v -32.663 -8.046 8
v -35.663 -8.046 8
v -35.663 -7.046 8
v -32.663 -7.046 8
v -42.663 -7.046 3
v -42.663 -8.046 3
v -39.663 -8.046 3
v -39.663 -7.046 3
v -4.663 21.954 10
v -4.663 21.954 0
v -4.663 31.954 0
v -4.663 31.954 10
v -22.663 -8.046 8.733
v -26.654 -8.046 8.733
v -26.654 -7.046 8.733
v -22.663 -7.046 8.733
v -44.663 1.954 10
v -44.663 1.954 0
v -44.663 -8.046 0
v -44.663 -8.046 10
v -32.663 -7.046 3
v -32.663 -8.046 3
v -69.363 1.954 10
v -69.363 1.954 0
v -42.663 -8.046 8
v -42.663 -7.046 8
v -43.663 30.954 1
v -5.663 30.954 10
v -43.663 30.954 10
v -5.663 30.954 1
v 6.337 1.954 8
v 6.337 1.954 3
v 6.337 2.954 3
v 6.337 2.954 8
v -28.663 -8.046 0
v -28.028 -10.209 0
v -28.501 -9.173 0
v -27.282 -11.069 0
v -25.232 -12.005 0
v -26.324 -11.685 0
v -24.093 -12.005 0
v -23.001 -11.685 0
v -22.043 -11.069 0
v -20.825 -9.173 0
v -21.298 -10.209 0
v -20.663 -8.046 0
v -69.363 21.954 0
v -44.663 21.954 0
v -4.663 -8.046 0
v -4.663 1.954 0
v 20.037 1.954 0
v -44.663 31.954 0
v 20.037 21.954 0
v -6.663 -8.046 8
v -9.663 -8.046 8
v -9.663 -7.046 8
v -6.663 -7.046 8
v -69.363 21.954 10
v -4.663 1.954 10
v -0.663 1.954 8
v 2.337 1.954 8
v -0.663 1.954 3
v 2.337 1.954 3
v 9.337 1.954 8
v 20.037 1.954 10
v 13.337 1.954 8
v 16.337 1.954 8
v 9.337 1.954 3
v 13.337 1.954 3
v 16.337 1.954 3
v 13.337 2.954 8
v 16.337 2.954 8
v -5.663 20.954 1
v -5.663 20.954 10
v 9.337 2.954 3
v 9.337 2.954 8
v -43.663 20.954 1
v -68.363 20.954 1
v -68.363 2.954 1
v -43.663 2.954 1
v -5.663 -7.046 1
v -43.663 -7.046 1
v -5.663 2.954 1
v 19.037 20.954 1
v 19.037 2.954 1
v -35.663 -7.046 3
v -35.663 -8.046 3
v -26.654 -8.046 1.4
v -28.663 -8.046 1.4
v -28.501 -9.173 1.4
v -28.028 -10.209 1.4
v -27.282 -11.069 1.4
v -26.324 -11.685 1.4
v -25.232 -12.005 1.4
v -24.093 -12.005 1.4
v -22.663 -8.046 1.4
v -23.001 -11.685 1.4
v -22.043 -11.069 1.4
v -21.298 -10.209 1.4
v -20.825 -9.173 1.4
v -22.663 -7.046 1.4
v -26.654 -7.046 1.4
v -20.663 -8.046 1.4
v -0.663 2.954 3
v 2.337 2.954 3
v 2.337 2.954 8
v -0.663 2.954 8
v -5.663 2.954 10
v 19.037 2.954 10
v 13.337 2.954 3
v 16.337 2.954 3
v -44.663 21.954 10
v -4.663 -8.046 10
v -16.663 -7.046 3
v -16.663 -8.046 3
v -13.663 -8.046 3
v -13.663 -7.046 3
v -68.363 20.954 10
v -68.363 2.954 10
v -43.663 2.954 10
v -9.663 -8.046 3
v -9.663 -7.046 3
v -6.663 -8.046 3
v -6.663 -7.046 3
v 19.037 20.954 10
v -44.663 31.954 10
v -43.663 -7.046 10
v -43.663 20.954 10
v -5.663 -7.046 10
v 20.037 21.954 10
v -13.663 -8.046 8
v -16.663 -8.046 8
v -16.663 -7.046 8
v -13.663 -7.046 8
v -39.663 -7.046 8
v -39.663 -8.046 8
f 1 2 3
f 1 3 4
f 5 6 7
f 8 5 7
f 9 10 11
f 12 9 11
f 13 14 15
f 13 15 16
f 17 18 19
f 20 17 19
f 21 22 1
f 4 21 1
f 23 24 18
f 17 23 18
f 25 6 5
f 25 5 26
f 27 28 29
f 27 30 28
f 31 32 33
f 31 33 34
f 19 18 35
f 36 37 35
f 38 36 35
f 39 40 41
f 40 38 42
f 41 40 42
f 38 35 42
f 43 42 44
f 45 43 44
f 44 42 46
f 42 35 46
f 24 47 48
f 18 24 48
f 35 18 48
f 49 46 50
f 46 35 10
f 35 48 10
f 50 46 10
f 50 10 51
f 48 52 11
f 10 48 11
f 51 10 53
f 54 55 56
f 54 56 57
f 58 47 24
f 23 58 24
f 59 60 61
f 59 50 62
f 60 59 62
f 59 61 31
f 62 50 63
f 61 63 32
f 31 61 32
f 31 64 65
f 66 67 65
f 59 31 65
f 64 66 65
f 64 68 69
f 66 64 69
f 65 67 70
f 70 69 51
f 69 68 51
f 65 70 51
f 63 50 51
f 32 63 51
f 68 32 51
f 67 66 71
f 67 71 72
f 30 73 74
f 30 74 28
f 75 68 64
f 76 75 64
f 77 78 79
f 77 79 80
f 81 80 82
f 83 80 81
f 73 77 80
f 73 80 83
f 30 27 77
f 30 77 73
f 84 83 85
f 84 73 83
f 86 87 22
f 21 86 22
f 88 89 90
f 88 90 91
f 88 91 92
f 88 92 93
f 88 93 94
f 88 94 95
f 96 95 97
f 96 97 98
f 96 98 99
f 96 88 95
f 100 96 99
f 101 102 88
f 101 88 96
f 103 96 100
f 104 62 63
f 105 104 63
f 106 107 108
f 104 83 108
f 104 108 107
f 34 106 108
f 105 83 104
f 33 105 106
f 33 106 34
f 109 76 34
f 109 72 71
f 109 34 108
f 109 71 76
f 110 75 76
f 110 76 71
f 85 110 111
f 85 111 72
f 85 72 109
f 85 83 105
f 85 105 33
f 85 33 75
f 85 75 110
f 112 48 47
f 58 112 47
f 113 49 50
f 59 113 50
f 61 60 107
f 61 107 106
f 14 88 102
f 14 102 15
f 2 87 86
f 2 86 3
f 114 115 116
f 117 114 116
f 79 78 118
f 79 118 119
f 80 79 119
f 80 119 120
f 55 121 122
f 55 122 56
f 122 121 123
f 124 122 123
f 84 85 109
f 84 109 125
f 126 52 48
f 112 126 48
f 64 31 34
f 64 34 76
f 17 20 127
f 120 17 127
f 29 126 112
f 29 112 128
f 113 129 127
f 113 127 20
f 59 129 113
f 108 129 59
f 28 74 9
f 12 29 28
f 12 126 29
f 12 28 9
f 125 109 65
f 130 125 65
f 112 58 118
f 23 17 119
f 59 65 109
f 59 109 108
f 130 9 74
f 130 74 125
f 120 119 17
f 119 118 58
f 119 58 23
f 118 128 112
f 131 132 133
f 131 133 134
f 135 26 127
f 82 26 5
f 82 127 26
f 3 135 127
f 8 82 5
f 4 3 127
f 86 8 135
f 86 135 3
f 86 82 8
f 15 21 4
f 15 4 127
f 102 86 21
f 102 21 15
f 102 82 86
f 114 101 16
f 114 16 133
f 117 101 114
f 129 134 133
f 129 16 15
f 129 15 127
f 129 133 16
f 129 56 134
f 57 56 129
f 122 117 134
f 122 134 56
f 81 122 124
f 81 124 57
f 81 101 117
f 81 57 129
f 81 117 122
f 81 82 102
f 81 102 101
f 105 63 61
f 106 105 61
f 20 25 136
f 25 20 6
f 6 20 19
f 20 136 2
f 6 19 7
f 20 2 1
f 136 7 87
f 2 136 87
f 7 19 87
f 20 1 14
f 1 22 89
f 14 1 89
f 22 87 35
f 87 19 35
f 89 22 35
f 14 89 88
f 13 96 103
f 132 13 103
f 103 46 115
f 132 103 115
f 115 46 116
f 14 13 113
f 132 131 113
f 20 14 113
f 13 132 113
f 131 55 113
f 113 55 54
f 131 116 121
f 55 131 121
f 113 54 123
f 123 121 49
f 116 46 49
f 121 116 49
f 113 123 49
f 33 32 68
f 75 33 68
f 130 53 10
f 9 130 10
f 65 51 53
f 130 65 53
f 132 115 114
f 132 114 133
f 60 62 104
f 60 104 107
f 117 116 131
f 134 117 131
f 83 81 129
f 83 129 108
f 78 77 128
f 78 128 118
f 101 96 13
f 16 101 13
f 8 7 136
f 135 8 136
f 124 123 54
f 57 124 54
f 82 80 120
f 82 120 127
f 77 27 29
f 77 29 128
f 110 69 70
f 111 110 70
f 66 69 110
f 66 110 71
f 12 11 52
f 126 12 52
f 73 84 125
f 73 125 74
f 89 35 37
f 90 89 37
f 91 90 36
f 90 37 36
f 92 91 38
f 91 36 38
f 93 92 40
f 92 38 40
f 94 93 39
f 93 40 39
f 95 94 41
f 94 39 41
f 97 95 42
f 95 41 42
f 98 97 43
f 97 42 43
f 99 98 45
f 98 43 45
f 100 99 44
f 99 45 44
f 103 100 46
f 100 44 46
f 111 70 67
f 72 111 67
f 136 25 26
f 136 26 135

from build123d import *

# Parameters (mm, degrees)
F1_DEPTH = 10
F2_T     = -1
F3_DEPTH = 1.4
F4_W     = 3
F4_H     = 5
F4_W_2   = 3.991
F4_H_2   = 7.333
F5_DEPTH = 12


with BuildPart() as f1:
    # F0 (on Top) → F1 (new body)
    with BuildSketch(Plane.XY):
        with BuildLine():
            Line((-44.662655282, 31.9538097456), (-44.662655282, 21.9538097456))
            Line((-44.662655282, 21.9538097456), (-69.362655282, 21.9538097456))
            Line((-69.362655282, 21.9538097456), (-69.362655282, 1.9538097456))
            Line((-69.362655282, 1.9538097456), (-44.662655282, 1.9538097456))
            Line((-44.662655282, 1.9538097456), (-44.662655282, -8.0461902544))
            Line((-44.662655282, -8.0461902544), (-28.662655282, -8.0461902544))
            ThreePointArc((-28.662655282, -8.0461902544), (-24.662655282, -4.0461902544), (-20.662655282, -8.0461902544))
            Line((-20.662655282, -8.0461902544), (-4.662655282, -8.0461902544))
            Line((-4.662655282, -8.0461902544), (-4.662655282, 1.9538097456))
            Line((-4.662655282, 1.9538097456), (20.037344718, 1.9538097456))
            Line((20.037344718, 1.9538097456), (20.037344718, 21.9538097456))
            Line((20.037344718, 21.9538097456), (-4.662655282, 21.9538097456))
            Line((-4.662655282, 21.9538097456), (-4.662655282, 31.9538097456))
            Line((-4.662655282, 31.9538097456), (-44.662655282, 31.9538097456))
        make_face()
        with BuildLine():
            ThreePointArc((-20.662655282, -8.0461902544), (-24.662655282, -4.0461902544), (-28.662655282, -8.0461902544))
            Line((-28.662655282, -8.0461902544), (-20.662655282, -8.0461902544))
        make_face()
    extrude(amount=F1_DEPTH)

    # F2
    f2_openings = [f1.faces().sort_by_distance(p)[0] for p in [
        (-24.662655, 11.95381, 10),
    ]]
    offset(amount=F2_T, openings=f2_openings, kind=Kind.INTERSECTION)

    # F0 (on Top) → F3 (join)
    with BuildSketch(Plane.XY):
        with BuildLine():
            Line((-20.662655282, -8.0461902544), (-28.662655282, -8.0461902544))
            ThreePointArc((-28.662655282, -8.0461902544), (-24.662655282, -12.0461902544), (-20.662655282, -8.0461902544))
        make_face()
    extrude(amount=F3_DEPTH)

    # F4 (on face) → F5 (cut)
    with BuildSketch(Plane.XZ.offset(8.0461902544)):
        with Locations((-41.162655282, 5.5)):
            Rectangle(F4_W, F4_H)
        with Locations((-34.162655282, 5.5)):
            Rectangle(F4_W, F4_H)
        with Locations((-15.162655282, 5.5)):
            Rectangle(F4_W, F4_H)
        with Locations((-8.162655282, 5.5)):
            Rectangle(F4_W, F4_H)
        with Locations((0.837344718, 5.5)):
            Rectangle(F4_W, F4_H)
        with Locations((7.837344718, 5.5)):
            Rectangle(F4_W, F4_H)
        with Locations((14.837344718, 5.5)):
            Rectangle(F4_W, F4_H)
        with Locations((-24.658155282, 5.0665)):
            Rectangle(F4_W_2, F4_H_2)
    extrude(amount=-F5_DEPTH, mode=Mode.SUBTRACT)


solid = f1.part
